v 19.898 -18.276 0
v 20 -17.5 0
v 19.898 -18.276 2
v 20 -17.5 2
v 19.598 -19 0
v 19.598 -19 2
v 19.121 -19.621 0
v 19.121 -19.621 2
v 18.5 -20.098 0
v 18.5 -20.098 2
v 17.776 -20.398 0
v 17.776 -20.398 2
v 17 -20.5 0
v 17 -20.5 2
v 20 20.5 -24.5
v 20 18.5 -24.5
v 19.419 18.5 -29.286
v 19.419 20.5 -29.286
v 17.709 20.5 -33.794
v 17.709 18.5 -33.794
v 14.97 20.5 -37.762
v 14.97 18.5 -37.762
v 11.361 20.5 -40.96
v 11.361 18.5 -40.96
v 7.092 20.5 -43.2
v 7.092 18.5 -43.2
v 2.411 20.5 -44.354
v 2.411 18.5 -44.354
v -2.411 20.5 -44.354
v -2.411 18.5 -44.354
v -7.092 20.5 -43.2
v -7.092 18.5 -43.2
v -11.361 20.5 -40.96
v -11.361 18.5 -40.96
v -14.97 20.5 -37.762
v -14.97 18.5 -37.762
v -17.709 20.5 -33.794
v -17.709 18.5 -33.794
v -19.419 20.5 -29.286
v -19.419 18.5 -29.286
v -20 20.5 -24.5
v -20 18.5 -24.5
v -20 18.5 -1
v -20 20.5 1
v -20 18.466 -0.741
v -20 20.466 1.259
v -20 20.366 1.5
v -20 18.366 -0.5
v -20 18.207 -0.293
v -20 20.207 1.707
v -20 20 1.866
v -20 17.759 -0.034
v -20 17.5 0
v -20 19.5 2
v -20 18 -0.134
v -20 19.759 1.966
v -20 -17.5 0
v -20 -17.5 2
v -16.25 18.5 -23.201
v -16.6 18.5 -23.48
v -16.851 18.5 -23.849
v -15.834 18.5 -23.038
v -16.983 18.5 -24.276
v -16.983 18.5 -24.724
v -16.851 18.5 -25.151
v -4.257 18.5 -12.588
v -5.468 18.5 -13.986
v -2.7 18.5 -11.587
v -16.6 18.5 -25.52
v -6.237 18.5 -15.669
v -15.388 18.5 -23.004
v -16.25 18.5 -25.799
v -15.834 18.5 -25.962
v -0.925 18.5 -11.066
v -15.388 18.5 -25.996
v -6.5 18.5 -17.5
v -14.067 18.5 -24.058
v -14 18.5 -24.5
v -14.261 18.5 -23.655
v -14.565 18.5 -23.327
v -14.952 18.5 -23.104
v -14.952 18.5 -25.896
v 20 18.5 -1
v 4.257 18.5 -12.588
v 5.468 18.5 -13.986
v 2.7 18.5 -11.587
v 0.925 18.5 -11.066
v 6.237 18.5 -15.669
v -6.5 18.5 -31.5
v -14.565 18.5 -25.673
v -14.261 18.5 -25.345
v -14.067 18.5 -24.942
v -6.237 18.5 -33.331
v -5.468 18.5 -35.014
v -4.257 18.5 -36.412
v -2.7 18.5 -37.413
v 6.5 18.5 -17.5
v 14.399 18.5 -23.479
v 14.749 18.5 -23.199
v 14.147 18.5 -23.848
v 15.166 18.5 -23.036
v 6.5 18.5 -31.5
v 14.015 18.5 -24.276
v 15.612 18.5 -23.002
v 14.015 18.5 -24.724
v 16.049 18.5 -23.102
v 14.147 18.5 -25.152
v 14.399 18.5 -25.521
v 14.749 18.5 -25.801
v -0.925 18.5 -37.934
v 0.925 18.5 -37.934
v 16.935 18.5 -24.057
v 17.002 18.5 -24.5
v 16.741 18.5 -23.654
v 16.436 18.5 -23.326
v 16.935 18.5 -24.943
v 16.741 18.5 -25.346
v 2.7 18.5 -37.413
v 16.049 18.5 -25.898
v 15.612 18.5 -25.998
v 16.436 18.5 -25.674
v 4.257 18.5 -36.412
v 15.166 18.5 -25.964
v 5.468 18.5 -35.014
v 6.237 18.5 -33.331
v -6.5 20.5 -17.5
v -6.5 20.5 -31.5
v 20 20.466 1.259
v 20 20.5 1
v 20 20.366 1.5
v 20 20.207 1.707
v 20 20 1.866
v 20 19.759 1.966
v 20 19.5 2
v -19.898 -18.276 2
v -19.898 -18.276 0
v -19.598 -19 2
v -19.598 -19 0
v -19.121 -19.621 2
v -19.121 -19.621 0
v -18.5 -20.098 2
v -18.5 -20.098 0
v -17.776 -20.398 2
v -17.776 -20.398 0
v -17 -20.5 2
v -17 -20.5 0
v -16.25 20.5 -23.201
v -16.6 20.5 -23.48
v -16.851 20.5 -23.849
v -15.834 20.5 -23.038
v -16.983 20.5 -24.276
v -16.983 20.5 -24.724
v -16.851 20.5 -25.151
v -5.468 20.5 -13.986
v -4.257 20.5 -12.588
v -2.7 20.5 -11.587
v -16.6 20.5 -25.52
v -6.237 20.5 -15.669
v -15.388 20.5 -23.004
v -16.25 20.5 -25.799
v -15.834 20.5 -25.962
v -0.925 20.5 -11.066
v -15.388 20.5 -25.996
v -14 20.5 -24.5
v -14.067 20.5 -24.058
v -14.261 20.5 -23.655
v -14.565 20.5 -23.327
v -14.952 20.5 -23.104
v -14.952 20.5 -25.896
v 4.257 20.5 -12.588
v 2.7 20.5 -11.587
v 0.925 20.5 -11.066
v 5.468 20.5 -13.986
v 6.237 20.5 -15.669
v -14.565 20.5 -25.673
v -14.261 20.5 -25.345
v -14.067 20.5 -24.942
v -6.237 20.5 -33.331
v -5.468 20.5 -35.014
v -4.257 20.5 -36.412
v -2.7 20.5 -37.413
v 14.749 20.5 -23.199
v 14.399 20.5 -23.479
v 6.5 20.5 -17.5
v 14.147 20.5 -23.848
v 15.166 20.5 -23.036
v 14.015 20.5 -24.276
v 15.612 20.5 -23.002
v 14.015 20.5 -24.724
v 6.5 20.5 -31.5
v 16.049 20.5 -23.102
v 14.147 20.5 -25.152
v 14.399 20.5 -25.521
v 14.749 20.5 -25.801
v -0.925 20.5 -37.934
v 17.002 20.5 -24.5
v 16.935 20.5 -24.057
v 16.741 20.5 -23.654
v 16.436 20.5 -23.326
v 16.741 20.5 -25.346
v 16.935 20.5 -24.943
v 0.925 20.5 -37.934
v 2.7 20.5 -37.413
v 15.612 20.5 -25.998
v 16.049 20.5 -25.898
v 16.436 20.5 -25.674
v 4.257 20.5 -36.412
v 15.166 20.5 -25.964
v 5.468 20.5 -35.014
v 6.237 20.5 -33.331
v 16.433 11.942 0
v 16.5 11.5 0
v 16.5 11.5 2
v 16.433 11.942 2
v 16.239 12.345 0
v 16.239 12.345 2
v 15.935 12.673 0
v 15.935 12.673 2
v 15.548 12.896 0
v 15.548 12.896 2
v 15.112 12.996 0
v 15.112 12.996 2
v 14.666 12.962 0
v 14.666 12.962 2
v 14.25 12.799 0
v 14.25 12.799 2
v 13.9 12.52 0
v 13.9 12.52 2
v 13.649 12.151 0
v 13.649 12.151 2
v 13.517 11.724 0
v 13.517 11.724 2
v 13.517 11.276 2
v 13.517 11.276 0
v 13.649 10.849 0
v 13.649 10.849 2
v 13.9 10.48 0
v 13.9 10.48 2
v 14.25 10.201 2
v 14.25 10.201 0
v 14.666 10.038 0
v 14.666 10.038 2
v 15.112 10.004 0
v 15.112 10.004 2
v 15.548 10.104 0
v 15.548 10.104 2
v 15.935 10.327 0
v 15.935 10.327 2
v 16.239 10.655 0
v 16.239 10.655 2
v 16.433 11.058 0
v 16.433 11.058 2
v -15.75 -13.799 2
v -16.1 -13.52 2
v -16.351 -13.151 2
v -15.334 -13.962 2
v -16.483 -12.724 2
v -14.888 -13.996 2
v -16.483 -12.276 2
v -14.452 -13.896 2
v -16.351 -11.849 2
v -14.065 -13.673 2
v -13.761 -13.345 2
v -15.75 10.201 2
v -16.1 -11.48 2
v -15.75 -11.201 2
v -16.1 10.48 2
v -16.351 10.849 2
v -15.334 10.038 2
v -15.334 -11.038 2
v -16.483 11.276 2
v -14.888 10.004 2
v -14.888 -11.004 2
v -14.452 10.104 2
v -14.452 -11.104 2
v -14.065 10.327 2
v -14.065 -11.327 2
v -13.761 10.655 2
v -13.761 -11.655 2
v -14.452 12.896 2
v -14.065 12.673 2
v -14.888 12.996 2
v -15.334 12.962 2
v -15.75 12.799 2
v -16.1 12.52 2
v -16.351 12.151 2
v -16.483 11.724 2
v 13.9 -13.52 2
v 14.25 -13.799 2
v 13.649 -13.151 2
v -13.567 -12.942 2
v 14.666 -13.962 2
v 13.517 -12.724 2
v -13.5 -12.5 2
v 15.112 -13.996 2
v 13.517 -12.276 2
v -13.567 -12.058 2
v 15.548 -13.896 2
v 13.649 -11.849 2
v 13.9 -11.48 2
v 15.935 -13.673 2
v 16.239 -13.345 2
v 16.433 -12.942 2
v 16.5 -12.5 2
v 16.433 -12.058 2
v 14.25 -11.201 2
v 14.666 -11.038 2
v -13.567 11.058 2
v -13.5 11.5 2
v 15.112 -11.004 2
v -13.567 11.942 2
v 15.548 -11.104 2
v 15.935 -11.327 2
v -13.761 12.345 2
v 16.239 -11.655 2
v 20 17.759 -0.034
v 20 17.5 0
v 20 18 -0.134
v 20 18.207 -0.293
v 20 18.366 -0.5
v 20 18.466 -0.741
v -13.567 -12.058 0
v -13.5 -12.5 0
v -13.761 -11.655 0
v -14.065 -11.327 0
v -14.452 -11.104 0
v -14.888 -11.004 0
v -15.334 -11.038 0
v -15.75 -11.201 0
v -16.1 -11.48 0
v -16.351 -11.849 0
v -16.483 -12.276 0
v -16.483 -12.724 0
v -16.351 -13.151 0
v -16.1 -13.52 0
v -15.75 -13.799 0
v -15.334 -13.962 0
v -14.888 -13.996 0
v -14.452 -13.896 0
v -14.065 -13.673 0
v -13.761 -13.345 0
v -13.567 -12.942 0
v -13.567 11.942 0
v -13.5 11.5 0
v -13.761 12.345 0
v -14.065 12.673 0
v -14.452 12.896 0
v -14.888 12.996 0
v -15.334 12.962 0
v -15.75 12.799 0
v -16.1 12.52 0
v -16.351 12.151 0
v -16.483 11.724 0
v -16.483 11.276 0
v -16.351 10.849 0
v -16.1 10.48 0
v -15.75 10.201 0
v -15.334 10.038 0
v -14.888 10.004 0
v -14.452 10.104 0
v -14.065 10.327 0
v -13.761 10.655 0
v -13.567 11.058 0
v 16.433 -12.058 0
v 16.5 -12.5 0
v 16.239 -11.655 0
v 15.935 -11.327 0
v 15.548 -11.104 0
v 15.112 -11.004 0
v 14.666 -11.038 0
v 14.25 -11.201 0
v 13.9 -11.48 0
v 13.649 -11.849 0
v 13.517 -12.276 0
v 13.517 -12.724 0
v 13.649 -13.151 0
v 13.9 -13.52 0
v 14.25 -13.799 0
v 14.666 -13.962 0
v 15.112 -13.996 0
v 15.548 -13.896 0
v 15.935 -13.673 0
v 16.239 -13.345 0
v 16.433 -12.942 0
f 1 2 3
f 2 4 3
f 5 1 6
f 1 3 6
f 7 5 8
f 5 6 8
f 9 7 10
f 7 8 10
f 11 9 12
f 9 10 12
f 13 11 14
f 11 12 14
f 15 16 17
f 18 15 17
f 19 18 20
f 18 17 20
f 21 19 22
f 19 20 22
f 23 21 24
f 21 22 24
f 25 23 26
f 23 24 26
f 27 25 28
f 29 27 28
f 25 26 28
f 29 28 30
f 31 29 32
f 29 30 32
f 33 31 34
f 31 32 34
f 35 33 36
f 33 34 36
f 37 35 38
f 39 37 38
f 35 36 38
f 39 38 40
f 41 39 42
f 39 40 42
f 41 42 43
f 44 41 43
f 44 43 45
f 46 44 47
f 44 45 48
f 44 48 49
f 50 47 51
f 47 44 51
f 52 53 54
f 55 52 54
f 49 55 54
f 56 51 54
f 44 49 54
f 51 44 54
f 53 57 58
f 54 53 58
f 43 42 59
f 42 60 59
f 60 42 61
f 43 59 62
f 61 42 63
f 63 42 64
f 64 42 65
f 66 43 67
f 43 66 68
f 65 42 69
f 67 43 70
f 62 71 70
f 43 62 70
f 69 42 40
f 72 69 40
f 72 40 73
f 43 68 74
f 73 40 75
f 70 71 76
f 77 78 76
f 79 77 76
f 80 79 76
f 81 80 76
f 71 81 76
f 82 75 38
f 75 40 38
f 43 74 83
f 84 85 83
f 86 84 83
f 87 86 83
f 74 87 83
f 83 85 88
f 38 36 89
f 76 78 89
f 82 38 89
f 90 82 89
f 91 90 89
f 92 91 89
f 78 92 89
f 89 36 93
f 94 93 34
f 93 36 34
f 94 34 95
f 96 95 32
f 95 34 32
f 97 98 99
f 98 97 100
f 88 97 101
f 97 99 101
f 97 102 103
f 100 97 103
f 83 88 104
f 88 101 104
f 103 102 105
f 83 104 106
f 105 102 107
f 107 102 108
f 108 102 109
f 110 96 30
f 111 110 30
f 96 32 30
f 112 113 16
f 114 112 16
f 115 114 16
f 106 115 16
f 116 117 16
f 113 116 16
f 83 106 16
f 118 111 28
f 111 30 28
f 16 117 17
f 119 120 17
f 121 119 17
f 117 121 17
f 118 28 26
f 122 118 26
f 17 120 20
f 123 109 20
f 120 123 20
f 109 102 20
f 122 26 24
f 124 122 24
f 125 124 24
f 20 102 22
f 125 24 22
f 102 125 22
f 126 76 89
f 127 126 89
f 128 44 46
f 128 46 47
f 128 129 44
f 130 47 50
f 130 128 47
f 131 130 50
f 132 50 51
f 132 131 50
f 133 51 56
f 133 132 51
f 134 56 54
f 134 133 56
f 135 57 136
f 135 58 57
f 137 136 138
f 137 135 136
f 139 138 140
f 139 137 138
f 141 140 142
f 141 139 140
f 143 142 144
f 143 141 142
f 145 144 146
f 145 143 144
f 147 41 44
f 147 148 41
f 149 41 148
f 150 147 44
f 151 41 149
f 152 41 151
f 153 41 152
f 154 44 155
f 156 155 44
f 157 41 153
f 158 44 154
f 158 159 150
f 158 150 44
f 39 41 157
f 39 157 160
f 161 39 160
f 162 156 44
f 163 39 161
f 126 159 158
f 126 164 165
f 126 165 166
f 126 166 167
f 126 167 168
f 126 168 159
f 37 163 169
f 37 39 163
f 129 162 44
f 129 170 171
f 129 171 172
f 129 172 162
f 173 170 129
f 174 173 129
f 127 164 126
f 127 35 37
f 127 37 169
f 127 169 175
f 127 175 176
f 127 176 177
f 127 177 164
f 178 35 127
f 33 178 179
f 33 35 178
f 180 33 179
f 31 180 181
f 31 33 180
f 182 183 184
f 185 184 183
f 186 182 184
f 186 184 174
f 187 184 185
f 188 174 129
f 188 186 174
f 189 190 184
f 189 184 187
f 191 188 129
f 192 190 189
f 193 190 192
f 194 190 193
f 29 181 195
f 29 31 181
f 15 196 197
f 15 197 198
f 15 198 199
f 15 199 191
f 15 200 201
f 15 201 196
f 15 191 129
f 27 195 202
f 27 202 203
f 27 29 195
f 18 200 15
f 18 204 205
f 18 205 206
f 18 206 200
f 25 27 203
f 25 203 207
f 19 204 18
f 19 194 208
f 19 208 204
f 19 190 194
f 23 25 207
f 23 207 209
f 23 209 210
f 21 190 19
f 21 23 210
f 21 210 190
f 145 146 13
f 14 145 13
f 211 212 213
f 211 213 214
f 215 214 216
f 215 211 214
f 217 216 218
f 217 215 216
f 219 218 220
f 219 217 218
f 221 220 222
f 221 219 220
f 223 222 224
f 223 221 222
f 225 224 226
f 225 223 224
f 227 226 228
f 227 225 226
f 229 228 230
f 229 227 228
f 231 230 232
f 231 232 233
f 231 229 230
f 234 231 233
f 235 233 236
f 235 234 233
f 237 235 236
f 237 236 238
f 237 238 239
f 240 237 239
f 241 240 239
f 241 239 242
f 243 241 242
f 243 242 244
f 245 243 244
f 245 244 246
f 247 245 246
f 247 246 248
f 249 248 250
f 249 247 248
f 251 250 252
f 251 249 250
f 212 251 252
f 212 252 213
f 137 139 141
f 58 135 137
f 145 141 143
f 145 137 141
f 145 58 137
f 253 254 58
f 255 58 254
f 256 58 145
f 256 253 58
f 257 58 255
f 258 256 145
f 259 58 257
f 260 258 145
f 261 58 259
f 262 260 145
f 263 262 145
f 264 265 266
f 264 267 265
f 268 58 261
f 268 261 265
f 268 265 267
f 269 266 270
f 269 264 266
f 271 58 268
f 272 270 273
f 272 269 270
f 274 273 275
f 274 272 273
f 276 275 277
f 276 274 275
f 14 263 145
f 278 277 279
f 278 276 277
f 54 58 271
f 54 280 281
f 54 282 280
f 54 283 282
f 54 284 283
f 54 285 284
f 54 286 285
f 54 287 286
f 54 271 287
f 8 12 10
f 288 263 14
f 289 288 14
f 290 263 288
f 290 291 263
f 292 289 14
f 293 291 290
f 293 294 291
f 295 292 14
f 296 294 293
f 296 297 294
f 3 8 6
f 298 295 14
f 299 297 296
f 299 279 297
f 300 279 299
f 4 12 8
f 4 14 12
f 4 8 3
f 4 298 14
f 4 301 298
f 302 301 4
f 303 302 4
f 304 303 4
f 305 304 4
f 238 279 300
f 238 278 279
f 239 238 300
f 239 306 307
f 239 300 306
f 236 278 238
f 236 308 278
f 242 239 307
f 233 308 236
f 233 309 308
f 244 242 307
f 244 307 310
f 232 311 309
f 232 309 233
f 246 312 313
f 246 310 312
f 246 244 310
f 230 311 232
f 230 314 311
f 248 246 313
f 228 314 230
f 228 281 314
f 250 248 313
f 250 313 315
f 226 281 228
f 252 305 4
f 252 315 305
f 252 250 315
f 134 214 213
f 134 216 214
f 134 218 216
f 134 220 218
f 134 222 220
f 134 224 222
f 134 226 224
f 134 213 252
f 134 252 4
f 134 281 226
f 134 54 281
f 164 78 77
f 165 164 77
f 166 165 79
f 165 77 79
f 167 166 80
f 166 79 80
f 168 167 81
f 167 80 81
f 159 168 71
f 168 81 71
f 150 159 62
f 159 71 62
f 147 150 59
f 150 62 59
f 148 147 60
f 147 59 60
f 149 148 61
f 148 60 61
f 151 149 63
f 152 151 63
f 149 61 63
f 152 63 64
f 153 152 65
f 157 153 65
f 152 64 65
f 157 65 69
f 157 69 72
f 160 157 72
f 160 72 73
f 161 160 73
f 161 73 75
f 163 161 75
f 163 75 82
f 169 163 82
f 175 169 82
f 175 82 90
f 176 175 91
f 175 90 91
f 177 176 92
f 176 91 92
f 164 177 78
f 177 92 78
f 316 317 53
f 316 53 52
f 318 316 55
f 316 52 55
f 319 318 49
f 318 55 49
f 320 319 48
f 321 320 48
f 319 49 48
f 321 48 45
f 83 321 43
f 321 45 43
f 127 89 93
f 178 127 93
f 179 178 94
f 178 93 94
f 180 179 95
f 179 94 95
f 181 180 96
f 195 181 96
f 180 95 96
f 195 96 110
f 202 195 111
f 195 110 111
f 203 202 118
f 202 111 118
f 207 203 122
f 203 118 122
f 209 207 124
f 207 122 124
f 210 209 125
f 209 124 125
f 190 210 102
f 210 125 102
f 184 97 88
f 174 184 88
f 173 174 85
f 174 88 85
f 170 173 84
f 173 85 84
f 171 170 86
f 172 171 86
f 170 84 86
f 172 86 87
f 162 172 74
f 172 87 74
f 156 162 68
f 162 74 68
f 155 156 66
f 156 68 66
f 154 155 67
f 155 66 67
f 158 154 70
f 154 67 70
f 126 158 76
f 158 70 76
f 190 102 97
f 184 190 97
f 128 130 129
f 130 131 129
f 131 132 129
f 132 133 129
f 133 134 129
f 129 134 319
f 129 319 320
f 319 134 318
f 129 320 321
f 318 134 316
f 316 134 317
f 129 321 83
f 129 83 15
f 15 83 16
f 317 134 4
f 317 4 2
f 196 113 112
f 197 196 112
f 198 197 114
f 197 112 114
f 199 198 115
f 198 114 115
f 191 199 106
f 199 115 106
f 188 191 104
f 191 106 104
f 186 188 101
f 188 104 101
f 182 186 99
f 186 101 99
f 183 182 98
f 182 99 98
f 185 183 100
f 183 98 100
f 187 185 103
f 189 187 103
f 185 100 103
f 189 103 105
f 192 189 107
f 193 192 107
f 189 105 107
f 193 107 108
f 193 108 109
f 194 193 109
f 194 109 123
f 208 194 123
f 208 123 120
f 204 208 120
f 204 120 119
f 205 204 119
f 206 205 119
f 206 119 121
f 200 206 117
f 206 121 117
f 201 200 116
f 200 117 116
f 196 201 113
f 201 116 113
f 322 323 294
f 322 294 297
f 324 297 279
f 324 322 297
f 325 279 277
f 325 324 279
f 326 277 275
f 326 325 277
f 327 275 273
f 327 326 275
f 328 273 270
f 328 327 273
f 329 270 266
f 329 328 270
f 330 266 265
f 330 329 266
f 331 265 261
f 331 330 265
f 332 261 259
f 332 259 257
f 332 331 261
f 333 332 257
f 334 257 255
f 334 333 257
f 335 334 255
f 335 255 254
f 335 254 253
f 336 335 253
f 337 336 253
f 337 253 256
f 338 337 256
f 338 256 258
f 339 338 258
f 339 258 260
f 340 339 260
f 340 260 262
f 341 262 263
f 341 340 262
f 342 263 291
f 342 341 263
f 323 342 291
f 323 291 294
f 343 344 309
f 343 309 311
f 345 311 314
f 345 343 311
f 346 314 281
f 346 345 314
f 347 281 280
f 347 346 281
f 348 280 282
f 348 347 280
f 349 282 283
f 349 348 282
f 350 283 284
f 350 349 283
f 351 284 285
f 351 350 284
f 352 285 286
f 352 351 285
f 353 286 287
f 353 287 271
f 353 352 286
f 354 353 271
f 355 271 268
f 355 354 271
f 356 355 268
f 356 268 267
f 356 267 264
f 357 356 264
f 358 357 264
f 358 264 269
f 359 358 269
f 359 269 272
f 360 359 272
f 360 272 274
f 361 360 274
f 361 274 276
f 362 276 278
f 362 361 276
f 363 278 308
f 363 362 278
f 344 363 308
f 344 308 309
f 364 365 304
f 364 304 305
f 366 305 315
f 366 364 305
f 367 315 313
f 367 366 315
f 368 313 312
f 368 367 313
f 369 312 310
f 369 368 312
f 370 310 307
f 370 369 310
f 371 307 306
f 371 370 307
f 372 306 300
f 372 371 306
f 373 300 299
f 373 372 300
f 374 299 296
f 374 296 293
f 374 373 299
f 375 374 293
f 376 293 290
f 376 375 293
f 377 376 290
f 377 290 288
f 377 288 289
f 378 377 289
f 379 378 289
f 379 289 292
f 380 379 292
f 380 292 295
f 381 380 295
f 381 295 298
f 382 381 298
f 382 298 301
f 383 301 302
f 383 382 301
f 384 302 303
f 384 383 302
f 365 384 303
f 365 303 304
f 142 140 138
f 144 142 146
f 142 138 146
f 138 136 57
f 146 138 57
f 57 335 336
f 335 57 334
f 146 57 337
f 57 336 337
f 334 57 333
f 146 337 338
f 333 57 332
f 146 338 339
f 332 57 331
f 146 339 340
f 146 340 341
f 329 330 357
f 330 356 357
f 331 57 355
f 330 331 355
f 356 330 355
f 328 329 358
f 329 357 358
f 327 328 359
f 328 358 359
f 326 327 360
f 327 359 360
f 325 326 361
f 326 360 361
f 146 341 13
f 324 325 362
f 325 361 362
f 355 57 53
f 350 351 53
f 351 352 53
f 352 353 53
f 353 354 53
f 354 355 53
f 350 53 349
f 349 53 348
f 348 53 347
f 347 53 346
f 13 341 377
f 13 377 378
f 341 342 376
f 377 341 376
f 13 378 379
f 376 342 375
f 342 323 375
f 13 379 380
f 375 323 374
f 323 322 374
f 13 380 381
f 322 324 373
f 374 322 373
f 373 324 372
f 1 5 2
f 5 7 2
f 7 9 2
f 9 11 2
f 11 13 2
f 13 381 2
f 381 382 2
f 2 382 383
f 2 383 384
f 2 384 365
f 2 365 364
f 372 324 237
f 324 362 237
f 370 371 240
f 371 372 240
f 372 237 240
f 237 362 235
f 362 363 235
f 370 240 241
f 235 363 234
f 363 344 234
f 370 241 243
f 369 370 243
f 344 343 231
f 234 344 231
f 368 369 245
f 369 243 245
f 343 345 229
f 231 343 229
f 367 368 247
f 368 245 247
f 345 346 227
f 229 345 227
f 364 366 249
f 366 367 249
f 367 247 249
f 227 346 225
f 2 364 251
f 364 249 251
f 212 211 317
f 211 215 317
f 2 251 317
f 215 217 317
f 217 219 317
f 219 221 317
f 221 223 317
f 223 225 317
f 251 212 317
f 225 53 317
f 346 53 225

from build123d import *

# Parameters (mm, degrees)
SKETCH_1_W      = 40
SKETCH_1_H      = 39
SKETCH_1_R      = 1.5
SKETCH_1_H_2    = 2
EXTRUDE_2_DEPTH = 2
EXTRUDE_3_DEPTH = 2
FILLET_1_R      = 1
FILLET_2_R      = 3


with BuildPart() as part:
    # 草图1 → 凸台-拉伸2 (new body)
    with BuildSketch(Plane.XY):
        with Locations((0, -1)):
            Rectangle(SKETCH_1_W, SKETCH_1_H)
        with Locations((-15, -12.5)):
            Circle(SKETCH_1_R, mode=Mode.SUBTRACT)
        with Locations((15, -12.5)):
            Circle(SKETCH_1_R, mode=Mode.SUBTRACT)
        with Locations((-15, 11.5)):
            Circle(SKETCH_1_R, mode=Mode.SUBTRACT)
        with Locations((15, 11.5)):
            Circle(SKETCH_1_R, mode=Mode.SUBTRACT)
        with Locations((0, 19.5)):
            Rectangle(SKETCH_1_W, SKETCH_1_H_2)
    extrude(amount=EXTRUDE_2_DEPTH)

    # 草图2 → 凸台-拉伸3 (add)
    with BuildSketch(Plane(origin=(0, 18.5, 0), x_dir=(1, 0, 0), z_dir=(0, 1, 0))):
        with BuildLine():
            ThreePointArc((20, 24.5), (0, 44.5), (-20, 24.5))
            Line((-20, 24.5), (-17, 24.5))
            ThreePointArc((-17, 24.5), (-15.5, 26), (-14, 24.5))
            Line((-14, 24.5), (-6.5, 24.5))
            Line((-6.5, 24.5), (-6.5, 31.5))
            ThreePointArc((-6.5, 31.5), (0, 38), (6.5, 31.5))
            Line((6.5, 31.5), (6.5, 24.5))
            Line((6.5, 24.5), (13.998241038, 24.5))
            ThreePointArc((13.998241038, 24.5), (15.5, 26.001758962), (17.001758962, 24.5))
            Line((17.001758962, 24.5), (20, 24.5))
        make_face()
        with BuildLine():
            Line((-17, 24.5), (-20, 24.5))
            ThreePointArc((-20, 24.5), (0, 4.5), (20, 24.5))
            Line((20, 24.5), (17.001758962, 24.5))
            ThreePointArc((17.001758962, 24.5), (15.5, 22.998241038), (13.998241038, 24.5))
            Line((13.998241038, 24.5), (6.5, 24.5))
            Line((6.5, 24.5), (6.5, 17.5))
            ThreePointArc((6.5, 17.5), (0, 11), (-6.5, 17.5))
            Line((-6.5, 17.5), (-6.5, 24.5))
            Line((-6.5, 24.5), (-14, 24.5))
            ThreePointArc((-14, 24.5), (-15.5, 23), (-17, 24.5))
        make_face()
        with BuildLine():
            Line((-20, 24.5), (-20, -2))
            Line((-20, -2), (20, -2))
            Line((20, -2), (20, 24.5))
            ThreePointArc((20, 24.5), (0, 4.5), (-20, 24.5))
        make_face()
    extrude(amount=EXTRUDE_3_DEPTH)

    # 圆角1
    fillet_1_edges = [part.edges().sort_by_distance(p)[0] for p in [
        (0, 18.5, 0),
        (0, 20.5, 2),
    ]]
    fillet(fillet_1_edges, radius=FILLET_1_R)

    # 圆角2
    fillet_2_edges = [part.edges().sort_by_distance(p)[0] for p in [
        (20, -20.5, 1),
        (-20, -20.5, 1),
    ]]
    fillet(fillet_2_edges, radius=FILLET_2_R)


solid = part.part
